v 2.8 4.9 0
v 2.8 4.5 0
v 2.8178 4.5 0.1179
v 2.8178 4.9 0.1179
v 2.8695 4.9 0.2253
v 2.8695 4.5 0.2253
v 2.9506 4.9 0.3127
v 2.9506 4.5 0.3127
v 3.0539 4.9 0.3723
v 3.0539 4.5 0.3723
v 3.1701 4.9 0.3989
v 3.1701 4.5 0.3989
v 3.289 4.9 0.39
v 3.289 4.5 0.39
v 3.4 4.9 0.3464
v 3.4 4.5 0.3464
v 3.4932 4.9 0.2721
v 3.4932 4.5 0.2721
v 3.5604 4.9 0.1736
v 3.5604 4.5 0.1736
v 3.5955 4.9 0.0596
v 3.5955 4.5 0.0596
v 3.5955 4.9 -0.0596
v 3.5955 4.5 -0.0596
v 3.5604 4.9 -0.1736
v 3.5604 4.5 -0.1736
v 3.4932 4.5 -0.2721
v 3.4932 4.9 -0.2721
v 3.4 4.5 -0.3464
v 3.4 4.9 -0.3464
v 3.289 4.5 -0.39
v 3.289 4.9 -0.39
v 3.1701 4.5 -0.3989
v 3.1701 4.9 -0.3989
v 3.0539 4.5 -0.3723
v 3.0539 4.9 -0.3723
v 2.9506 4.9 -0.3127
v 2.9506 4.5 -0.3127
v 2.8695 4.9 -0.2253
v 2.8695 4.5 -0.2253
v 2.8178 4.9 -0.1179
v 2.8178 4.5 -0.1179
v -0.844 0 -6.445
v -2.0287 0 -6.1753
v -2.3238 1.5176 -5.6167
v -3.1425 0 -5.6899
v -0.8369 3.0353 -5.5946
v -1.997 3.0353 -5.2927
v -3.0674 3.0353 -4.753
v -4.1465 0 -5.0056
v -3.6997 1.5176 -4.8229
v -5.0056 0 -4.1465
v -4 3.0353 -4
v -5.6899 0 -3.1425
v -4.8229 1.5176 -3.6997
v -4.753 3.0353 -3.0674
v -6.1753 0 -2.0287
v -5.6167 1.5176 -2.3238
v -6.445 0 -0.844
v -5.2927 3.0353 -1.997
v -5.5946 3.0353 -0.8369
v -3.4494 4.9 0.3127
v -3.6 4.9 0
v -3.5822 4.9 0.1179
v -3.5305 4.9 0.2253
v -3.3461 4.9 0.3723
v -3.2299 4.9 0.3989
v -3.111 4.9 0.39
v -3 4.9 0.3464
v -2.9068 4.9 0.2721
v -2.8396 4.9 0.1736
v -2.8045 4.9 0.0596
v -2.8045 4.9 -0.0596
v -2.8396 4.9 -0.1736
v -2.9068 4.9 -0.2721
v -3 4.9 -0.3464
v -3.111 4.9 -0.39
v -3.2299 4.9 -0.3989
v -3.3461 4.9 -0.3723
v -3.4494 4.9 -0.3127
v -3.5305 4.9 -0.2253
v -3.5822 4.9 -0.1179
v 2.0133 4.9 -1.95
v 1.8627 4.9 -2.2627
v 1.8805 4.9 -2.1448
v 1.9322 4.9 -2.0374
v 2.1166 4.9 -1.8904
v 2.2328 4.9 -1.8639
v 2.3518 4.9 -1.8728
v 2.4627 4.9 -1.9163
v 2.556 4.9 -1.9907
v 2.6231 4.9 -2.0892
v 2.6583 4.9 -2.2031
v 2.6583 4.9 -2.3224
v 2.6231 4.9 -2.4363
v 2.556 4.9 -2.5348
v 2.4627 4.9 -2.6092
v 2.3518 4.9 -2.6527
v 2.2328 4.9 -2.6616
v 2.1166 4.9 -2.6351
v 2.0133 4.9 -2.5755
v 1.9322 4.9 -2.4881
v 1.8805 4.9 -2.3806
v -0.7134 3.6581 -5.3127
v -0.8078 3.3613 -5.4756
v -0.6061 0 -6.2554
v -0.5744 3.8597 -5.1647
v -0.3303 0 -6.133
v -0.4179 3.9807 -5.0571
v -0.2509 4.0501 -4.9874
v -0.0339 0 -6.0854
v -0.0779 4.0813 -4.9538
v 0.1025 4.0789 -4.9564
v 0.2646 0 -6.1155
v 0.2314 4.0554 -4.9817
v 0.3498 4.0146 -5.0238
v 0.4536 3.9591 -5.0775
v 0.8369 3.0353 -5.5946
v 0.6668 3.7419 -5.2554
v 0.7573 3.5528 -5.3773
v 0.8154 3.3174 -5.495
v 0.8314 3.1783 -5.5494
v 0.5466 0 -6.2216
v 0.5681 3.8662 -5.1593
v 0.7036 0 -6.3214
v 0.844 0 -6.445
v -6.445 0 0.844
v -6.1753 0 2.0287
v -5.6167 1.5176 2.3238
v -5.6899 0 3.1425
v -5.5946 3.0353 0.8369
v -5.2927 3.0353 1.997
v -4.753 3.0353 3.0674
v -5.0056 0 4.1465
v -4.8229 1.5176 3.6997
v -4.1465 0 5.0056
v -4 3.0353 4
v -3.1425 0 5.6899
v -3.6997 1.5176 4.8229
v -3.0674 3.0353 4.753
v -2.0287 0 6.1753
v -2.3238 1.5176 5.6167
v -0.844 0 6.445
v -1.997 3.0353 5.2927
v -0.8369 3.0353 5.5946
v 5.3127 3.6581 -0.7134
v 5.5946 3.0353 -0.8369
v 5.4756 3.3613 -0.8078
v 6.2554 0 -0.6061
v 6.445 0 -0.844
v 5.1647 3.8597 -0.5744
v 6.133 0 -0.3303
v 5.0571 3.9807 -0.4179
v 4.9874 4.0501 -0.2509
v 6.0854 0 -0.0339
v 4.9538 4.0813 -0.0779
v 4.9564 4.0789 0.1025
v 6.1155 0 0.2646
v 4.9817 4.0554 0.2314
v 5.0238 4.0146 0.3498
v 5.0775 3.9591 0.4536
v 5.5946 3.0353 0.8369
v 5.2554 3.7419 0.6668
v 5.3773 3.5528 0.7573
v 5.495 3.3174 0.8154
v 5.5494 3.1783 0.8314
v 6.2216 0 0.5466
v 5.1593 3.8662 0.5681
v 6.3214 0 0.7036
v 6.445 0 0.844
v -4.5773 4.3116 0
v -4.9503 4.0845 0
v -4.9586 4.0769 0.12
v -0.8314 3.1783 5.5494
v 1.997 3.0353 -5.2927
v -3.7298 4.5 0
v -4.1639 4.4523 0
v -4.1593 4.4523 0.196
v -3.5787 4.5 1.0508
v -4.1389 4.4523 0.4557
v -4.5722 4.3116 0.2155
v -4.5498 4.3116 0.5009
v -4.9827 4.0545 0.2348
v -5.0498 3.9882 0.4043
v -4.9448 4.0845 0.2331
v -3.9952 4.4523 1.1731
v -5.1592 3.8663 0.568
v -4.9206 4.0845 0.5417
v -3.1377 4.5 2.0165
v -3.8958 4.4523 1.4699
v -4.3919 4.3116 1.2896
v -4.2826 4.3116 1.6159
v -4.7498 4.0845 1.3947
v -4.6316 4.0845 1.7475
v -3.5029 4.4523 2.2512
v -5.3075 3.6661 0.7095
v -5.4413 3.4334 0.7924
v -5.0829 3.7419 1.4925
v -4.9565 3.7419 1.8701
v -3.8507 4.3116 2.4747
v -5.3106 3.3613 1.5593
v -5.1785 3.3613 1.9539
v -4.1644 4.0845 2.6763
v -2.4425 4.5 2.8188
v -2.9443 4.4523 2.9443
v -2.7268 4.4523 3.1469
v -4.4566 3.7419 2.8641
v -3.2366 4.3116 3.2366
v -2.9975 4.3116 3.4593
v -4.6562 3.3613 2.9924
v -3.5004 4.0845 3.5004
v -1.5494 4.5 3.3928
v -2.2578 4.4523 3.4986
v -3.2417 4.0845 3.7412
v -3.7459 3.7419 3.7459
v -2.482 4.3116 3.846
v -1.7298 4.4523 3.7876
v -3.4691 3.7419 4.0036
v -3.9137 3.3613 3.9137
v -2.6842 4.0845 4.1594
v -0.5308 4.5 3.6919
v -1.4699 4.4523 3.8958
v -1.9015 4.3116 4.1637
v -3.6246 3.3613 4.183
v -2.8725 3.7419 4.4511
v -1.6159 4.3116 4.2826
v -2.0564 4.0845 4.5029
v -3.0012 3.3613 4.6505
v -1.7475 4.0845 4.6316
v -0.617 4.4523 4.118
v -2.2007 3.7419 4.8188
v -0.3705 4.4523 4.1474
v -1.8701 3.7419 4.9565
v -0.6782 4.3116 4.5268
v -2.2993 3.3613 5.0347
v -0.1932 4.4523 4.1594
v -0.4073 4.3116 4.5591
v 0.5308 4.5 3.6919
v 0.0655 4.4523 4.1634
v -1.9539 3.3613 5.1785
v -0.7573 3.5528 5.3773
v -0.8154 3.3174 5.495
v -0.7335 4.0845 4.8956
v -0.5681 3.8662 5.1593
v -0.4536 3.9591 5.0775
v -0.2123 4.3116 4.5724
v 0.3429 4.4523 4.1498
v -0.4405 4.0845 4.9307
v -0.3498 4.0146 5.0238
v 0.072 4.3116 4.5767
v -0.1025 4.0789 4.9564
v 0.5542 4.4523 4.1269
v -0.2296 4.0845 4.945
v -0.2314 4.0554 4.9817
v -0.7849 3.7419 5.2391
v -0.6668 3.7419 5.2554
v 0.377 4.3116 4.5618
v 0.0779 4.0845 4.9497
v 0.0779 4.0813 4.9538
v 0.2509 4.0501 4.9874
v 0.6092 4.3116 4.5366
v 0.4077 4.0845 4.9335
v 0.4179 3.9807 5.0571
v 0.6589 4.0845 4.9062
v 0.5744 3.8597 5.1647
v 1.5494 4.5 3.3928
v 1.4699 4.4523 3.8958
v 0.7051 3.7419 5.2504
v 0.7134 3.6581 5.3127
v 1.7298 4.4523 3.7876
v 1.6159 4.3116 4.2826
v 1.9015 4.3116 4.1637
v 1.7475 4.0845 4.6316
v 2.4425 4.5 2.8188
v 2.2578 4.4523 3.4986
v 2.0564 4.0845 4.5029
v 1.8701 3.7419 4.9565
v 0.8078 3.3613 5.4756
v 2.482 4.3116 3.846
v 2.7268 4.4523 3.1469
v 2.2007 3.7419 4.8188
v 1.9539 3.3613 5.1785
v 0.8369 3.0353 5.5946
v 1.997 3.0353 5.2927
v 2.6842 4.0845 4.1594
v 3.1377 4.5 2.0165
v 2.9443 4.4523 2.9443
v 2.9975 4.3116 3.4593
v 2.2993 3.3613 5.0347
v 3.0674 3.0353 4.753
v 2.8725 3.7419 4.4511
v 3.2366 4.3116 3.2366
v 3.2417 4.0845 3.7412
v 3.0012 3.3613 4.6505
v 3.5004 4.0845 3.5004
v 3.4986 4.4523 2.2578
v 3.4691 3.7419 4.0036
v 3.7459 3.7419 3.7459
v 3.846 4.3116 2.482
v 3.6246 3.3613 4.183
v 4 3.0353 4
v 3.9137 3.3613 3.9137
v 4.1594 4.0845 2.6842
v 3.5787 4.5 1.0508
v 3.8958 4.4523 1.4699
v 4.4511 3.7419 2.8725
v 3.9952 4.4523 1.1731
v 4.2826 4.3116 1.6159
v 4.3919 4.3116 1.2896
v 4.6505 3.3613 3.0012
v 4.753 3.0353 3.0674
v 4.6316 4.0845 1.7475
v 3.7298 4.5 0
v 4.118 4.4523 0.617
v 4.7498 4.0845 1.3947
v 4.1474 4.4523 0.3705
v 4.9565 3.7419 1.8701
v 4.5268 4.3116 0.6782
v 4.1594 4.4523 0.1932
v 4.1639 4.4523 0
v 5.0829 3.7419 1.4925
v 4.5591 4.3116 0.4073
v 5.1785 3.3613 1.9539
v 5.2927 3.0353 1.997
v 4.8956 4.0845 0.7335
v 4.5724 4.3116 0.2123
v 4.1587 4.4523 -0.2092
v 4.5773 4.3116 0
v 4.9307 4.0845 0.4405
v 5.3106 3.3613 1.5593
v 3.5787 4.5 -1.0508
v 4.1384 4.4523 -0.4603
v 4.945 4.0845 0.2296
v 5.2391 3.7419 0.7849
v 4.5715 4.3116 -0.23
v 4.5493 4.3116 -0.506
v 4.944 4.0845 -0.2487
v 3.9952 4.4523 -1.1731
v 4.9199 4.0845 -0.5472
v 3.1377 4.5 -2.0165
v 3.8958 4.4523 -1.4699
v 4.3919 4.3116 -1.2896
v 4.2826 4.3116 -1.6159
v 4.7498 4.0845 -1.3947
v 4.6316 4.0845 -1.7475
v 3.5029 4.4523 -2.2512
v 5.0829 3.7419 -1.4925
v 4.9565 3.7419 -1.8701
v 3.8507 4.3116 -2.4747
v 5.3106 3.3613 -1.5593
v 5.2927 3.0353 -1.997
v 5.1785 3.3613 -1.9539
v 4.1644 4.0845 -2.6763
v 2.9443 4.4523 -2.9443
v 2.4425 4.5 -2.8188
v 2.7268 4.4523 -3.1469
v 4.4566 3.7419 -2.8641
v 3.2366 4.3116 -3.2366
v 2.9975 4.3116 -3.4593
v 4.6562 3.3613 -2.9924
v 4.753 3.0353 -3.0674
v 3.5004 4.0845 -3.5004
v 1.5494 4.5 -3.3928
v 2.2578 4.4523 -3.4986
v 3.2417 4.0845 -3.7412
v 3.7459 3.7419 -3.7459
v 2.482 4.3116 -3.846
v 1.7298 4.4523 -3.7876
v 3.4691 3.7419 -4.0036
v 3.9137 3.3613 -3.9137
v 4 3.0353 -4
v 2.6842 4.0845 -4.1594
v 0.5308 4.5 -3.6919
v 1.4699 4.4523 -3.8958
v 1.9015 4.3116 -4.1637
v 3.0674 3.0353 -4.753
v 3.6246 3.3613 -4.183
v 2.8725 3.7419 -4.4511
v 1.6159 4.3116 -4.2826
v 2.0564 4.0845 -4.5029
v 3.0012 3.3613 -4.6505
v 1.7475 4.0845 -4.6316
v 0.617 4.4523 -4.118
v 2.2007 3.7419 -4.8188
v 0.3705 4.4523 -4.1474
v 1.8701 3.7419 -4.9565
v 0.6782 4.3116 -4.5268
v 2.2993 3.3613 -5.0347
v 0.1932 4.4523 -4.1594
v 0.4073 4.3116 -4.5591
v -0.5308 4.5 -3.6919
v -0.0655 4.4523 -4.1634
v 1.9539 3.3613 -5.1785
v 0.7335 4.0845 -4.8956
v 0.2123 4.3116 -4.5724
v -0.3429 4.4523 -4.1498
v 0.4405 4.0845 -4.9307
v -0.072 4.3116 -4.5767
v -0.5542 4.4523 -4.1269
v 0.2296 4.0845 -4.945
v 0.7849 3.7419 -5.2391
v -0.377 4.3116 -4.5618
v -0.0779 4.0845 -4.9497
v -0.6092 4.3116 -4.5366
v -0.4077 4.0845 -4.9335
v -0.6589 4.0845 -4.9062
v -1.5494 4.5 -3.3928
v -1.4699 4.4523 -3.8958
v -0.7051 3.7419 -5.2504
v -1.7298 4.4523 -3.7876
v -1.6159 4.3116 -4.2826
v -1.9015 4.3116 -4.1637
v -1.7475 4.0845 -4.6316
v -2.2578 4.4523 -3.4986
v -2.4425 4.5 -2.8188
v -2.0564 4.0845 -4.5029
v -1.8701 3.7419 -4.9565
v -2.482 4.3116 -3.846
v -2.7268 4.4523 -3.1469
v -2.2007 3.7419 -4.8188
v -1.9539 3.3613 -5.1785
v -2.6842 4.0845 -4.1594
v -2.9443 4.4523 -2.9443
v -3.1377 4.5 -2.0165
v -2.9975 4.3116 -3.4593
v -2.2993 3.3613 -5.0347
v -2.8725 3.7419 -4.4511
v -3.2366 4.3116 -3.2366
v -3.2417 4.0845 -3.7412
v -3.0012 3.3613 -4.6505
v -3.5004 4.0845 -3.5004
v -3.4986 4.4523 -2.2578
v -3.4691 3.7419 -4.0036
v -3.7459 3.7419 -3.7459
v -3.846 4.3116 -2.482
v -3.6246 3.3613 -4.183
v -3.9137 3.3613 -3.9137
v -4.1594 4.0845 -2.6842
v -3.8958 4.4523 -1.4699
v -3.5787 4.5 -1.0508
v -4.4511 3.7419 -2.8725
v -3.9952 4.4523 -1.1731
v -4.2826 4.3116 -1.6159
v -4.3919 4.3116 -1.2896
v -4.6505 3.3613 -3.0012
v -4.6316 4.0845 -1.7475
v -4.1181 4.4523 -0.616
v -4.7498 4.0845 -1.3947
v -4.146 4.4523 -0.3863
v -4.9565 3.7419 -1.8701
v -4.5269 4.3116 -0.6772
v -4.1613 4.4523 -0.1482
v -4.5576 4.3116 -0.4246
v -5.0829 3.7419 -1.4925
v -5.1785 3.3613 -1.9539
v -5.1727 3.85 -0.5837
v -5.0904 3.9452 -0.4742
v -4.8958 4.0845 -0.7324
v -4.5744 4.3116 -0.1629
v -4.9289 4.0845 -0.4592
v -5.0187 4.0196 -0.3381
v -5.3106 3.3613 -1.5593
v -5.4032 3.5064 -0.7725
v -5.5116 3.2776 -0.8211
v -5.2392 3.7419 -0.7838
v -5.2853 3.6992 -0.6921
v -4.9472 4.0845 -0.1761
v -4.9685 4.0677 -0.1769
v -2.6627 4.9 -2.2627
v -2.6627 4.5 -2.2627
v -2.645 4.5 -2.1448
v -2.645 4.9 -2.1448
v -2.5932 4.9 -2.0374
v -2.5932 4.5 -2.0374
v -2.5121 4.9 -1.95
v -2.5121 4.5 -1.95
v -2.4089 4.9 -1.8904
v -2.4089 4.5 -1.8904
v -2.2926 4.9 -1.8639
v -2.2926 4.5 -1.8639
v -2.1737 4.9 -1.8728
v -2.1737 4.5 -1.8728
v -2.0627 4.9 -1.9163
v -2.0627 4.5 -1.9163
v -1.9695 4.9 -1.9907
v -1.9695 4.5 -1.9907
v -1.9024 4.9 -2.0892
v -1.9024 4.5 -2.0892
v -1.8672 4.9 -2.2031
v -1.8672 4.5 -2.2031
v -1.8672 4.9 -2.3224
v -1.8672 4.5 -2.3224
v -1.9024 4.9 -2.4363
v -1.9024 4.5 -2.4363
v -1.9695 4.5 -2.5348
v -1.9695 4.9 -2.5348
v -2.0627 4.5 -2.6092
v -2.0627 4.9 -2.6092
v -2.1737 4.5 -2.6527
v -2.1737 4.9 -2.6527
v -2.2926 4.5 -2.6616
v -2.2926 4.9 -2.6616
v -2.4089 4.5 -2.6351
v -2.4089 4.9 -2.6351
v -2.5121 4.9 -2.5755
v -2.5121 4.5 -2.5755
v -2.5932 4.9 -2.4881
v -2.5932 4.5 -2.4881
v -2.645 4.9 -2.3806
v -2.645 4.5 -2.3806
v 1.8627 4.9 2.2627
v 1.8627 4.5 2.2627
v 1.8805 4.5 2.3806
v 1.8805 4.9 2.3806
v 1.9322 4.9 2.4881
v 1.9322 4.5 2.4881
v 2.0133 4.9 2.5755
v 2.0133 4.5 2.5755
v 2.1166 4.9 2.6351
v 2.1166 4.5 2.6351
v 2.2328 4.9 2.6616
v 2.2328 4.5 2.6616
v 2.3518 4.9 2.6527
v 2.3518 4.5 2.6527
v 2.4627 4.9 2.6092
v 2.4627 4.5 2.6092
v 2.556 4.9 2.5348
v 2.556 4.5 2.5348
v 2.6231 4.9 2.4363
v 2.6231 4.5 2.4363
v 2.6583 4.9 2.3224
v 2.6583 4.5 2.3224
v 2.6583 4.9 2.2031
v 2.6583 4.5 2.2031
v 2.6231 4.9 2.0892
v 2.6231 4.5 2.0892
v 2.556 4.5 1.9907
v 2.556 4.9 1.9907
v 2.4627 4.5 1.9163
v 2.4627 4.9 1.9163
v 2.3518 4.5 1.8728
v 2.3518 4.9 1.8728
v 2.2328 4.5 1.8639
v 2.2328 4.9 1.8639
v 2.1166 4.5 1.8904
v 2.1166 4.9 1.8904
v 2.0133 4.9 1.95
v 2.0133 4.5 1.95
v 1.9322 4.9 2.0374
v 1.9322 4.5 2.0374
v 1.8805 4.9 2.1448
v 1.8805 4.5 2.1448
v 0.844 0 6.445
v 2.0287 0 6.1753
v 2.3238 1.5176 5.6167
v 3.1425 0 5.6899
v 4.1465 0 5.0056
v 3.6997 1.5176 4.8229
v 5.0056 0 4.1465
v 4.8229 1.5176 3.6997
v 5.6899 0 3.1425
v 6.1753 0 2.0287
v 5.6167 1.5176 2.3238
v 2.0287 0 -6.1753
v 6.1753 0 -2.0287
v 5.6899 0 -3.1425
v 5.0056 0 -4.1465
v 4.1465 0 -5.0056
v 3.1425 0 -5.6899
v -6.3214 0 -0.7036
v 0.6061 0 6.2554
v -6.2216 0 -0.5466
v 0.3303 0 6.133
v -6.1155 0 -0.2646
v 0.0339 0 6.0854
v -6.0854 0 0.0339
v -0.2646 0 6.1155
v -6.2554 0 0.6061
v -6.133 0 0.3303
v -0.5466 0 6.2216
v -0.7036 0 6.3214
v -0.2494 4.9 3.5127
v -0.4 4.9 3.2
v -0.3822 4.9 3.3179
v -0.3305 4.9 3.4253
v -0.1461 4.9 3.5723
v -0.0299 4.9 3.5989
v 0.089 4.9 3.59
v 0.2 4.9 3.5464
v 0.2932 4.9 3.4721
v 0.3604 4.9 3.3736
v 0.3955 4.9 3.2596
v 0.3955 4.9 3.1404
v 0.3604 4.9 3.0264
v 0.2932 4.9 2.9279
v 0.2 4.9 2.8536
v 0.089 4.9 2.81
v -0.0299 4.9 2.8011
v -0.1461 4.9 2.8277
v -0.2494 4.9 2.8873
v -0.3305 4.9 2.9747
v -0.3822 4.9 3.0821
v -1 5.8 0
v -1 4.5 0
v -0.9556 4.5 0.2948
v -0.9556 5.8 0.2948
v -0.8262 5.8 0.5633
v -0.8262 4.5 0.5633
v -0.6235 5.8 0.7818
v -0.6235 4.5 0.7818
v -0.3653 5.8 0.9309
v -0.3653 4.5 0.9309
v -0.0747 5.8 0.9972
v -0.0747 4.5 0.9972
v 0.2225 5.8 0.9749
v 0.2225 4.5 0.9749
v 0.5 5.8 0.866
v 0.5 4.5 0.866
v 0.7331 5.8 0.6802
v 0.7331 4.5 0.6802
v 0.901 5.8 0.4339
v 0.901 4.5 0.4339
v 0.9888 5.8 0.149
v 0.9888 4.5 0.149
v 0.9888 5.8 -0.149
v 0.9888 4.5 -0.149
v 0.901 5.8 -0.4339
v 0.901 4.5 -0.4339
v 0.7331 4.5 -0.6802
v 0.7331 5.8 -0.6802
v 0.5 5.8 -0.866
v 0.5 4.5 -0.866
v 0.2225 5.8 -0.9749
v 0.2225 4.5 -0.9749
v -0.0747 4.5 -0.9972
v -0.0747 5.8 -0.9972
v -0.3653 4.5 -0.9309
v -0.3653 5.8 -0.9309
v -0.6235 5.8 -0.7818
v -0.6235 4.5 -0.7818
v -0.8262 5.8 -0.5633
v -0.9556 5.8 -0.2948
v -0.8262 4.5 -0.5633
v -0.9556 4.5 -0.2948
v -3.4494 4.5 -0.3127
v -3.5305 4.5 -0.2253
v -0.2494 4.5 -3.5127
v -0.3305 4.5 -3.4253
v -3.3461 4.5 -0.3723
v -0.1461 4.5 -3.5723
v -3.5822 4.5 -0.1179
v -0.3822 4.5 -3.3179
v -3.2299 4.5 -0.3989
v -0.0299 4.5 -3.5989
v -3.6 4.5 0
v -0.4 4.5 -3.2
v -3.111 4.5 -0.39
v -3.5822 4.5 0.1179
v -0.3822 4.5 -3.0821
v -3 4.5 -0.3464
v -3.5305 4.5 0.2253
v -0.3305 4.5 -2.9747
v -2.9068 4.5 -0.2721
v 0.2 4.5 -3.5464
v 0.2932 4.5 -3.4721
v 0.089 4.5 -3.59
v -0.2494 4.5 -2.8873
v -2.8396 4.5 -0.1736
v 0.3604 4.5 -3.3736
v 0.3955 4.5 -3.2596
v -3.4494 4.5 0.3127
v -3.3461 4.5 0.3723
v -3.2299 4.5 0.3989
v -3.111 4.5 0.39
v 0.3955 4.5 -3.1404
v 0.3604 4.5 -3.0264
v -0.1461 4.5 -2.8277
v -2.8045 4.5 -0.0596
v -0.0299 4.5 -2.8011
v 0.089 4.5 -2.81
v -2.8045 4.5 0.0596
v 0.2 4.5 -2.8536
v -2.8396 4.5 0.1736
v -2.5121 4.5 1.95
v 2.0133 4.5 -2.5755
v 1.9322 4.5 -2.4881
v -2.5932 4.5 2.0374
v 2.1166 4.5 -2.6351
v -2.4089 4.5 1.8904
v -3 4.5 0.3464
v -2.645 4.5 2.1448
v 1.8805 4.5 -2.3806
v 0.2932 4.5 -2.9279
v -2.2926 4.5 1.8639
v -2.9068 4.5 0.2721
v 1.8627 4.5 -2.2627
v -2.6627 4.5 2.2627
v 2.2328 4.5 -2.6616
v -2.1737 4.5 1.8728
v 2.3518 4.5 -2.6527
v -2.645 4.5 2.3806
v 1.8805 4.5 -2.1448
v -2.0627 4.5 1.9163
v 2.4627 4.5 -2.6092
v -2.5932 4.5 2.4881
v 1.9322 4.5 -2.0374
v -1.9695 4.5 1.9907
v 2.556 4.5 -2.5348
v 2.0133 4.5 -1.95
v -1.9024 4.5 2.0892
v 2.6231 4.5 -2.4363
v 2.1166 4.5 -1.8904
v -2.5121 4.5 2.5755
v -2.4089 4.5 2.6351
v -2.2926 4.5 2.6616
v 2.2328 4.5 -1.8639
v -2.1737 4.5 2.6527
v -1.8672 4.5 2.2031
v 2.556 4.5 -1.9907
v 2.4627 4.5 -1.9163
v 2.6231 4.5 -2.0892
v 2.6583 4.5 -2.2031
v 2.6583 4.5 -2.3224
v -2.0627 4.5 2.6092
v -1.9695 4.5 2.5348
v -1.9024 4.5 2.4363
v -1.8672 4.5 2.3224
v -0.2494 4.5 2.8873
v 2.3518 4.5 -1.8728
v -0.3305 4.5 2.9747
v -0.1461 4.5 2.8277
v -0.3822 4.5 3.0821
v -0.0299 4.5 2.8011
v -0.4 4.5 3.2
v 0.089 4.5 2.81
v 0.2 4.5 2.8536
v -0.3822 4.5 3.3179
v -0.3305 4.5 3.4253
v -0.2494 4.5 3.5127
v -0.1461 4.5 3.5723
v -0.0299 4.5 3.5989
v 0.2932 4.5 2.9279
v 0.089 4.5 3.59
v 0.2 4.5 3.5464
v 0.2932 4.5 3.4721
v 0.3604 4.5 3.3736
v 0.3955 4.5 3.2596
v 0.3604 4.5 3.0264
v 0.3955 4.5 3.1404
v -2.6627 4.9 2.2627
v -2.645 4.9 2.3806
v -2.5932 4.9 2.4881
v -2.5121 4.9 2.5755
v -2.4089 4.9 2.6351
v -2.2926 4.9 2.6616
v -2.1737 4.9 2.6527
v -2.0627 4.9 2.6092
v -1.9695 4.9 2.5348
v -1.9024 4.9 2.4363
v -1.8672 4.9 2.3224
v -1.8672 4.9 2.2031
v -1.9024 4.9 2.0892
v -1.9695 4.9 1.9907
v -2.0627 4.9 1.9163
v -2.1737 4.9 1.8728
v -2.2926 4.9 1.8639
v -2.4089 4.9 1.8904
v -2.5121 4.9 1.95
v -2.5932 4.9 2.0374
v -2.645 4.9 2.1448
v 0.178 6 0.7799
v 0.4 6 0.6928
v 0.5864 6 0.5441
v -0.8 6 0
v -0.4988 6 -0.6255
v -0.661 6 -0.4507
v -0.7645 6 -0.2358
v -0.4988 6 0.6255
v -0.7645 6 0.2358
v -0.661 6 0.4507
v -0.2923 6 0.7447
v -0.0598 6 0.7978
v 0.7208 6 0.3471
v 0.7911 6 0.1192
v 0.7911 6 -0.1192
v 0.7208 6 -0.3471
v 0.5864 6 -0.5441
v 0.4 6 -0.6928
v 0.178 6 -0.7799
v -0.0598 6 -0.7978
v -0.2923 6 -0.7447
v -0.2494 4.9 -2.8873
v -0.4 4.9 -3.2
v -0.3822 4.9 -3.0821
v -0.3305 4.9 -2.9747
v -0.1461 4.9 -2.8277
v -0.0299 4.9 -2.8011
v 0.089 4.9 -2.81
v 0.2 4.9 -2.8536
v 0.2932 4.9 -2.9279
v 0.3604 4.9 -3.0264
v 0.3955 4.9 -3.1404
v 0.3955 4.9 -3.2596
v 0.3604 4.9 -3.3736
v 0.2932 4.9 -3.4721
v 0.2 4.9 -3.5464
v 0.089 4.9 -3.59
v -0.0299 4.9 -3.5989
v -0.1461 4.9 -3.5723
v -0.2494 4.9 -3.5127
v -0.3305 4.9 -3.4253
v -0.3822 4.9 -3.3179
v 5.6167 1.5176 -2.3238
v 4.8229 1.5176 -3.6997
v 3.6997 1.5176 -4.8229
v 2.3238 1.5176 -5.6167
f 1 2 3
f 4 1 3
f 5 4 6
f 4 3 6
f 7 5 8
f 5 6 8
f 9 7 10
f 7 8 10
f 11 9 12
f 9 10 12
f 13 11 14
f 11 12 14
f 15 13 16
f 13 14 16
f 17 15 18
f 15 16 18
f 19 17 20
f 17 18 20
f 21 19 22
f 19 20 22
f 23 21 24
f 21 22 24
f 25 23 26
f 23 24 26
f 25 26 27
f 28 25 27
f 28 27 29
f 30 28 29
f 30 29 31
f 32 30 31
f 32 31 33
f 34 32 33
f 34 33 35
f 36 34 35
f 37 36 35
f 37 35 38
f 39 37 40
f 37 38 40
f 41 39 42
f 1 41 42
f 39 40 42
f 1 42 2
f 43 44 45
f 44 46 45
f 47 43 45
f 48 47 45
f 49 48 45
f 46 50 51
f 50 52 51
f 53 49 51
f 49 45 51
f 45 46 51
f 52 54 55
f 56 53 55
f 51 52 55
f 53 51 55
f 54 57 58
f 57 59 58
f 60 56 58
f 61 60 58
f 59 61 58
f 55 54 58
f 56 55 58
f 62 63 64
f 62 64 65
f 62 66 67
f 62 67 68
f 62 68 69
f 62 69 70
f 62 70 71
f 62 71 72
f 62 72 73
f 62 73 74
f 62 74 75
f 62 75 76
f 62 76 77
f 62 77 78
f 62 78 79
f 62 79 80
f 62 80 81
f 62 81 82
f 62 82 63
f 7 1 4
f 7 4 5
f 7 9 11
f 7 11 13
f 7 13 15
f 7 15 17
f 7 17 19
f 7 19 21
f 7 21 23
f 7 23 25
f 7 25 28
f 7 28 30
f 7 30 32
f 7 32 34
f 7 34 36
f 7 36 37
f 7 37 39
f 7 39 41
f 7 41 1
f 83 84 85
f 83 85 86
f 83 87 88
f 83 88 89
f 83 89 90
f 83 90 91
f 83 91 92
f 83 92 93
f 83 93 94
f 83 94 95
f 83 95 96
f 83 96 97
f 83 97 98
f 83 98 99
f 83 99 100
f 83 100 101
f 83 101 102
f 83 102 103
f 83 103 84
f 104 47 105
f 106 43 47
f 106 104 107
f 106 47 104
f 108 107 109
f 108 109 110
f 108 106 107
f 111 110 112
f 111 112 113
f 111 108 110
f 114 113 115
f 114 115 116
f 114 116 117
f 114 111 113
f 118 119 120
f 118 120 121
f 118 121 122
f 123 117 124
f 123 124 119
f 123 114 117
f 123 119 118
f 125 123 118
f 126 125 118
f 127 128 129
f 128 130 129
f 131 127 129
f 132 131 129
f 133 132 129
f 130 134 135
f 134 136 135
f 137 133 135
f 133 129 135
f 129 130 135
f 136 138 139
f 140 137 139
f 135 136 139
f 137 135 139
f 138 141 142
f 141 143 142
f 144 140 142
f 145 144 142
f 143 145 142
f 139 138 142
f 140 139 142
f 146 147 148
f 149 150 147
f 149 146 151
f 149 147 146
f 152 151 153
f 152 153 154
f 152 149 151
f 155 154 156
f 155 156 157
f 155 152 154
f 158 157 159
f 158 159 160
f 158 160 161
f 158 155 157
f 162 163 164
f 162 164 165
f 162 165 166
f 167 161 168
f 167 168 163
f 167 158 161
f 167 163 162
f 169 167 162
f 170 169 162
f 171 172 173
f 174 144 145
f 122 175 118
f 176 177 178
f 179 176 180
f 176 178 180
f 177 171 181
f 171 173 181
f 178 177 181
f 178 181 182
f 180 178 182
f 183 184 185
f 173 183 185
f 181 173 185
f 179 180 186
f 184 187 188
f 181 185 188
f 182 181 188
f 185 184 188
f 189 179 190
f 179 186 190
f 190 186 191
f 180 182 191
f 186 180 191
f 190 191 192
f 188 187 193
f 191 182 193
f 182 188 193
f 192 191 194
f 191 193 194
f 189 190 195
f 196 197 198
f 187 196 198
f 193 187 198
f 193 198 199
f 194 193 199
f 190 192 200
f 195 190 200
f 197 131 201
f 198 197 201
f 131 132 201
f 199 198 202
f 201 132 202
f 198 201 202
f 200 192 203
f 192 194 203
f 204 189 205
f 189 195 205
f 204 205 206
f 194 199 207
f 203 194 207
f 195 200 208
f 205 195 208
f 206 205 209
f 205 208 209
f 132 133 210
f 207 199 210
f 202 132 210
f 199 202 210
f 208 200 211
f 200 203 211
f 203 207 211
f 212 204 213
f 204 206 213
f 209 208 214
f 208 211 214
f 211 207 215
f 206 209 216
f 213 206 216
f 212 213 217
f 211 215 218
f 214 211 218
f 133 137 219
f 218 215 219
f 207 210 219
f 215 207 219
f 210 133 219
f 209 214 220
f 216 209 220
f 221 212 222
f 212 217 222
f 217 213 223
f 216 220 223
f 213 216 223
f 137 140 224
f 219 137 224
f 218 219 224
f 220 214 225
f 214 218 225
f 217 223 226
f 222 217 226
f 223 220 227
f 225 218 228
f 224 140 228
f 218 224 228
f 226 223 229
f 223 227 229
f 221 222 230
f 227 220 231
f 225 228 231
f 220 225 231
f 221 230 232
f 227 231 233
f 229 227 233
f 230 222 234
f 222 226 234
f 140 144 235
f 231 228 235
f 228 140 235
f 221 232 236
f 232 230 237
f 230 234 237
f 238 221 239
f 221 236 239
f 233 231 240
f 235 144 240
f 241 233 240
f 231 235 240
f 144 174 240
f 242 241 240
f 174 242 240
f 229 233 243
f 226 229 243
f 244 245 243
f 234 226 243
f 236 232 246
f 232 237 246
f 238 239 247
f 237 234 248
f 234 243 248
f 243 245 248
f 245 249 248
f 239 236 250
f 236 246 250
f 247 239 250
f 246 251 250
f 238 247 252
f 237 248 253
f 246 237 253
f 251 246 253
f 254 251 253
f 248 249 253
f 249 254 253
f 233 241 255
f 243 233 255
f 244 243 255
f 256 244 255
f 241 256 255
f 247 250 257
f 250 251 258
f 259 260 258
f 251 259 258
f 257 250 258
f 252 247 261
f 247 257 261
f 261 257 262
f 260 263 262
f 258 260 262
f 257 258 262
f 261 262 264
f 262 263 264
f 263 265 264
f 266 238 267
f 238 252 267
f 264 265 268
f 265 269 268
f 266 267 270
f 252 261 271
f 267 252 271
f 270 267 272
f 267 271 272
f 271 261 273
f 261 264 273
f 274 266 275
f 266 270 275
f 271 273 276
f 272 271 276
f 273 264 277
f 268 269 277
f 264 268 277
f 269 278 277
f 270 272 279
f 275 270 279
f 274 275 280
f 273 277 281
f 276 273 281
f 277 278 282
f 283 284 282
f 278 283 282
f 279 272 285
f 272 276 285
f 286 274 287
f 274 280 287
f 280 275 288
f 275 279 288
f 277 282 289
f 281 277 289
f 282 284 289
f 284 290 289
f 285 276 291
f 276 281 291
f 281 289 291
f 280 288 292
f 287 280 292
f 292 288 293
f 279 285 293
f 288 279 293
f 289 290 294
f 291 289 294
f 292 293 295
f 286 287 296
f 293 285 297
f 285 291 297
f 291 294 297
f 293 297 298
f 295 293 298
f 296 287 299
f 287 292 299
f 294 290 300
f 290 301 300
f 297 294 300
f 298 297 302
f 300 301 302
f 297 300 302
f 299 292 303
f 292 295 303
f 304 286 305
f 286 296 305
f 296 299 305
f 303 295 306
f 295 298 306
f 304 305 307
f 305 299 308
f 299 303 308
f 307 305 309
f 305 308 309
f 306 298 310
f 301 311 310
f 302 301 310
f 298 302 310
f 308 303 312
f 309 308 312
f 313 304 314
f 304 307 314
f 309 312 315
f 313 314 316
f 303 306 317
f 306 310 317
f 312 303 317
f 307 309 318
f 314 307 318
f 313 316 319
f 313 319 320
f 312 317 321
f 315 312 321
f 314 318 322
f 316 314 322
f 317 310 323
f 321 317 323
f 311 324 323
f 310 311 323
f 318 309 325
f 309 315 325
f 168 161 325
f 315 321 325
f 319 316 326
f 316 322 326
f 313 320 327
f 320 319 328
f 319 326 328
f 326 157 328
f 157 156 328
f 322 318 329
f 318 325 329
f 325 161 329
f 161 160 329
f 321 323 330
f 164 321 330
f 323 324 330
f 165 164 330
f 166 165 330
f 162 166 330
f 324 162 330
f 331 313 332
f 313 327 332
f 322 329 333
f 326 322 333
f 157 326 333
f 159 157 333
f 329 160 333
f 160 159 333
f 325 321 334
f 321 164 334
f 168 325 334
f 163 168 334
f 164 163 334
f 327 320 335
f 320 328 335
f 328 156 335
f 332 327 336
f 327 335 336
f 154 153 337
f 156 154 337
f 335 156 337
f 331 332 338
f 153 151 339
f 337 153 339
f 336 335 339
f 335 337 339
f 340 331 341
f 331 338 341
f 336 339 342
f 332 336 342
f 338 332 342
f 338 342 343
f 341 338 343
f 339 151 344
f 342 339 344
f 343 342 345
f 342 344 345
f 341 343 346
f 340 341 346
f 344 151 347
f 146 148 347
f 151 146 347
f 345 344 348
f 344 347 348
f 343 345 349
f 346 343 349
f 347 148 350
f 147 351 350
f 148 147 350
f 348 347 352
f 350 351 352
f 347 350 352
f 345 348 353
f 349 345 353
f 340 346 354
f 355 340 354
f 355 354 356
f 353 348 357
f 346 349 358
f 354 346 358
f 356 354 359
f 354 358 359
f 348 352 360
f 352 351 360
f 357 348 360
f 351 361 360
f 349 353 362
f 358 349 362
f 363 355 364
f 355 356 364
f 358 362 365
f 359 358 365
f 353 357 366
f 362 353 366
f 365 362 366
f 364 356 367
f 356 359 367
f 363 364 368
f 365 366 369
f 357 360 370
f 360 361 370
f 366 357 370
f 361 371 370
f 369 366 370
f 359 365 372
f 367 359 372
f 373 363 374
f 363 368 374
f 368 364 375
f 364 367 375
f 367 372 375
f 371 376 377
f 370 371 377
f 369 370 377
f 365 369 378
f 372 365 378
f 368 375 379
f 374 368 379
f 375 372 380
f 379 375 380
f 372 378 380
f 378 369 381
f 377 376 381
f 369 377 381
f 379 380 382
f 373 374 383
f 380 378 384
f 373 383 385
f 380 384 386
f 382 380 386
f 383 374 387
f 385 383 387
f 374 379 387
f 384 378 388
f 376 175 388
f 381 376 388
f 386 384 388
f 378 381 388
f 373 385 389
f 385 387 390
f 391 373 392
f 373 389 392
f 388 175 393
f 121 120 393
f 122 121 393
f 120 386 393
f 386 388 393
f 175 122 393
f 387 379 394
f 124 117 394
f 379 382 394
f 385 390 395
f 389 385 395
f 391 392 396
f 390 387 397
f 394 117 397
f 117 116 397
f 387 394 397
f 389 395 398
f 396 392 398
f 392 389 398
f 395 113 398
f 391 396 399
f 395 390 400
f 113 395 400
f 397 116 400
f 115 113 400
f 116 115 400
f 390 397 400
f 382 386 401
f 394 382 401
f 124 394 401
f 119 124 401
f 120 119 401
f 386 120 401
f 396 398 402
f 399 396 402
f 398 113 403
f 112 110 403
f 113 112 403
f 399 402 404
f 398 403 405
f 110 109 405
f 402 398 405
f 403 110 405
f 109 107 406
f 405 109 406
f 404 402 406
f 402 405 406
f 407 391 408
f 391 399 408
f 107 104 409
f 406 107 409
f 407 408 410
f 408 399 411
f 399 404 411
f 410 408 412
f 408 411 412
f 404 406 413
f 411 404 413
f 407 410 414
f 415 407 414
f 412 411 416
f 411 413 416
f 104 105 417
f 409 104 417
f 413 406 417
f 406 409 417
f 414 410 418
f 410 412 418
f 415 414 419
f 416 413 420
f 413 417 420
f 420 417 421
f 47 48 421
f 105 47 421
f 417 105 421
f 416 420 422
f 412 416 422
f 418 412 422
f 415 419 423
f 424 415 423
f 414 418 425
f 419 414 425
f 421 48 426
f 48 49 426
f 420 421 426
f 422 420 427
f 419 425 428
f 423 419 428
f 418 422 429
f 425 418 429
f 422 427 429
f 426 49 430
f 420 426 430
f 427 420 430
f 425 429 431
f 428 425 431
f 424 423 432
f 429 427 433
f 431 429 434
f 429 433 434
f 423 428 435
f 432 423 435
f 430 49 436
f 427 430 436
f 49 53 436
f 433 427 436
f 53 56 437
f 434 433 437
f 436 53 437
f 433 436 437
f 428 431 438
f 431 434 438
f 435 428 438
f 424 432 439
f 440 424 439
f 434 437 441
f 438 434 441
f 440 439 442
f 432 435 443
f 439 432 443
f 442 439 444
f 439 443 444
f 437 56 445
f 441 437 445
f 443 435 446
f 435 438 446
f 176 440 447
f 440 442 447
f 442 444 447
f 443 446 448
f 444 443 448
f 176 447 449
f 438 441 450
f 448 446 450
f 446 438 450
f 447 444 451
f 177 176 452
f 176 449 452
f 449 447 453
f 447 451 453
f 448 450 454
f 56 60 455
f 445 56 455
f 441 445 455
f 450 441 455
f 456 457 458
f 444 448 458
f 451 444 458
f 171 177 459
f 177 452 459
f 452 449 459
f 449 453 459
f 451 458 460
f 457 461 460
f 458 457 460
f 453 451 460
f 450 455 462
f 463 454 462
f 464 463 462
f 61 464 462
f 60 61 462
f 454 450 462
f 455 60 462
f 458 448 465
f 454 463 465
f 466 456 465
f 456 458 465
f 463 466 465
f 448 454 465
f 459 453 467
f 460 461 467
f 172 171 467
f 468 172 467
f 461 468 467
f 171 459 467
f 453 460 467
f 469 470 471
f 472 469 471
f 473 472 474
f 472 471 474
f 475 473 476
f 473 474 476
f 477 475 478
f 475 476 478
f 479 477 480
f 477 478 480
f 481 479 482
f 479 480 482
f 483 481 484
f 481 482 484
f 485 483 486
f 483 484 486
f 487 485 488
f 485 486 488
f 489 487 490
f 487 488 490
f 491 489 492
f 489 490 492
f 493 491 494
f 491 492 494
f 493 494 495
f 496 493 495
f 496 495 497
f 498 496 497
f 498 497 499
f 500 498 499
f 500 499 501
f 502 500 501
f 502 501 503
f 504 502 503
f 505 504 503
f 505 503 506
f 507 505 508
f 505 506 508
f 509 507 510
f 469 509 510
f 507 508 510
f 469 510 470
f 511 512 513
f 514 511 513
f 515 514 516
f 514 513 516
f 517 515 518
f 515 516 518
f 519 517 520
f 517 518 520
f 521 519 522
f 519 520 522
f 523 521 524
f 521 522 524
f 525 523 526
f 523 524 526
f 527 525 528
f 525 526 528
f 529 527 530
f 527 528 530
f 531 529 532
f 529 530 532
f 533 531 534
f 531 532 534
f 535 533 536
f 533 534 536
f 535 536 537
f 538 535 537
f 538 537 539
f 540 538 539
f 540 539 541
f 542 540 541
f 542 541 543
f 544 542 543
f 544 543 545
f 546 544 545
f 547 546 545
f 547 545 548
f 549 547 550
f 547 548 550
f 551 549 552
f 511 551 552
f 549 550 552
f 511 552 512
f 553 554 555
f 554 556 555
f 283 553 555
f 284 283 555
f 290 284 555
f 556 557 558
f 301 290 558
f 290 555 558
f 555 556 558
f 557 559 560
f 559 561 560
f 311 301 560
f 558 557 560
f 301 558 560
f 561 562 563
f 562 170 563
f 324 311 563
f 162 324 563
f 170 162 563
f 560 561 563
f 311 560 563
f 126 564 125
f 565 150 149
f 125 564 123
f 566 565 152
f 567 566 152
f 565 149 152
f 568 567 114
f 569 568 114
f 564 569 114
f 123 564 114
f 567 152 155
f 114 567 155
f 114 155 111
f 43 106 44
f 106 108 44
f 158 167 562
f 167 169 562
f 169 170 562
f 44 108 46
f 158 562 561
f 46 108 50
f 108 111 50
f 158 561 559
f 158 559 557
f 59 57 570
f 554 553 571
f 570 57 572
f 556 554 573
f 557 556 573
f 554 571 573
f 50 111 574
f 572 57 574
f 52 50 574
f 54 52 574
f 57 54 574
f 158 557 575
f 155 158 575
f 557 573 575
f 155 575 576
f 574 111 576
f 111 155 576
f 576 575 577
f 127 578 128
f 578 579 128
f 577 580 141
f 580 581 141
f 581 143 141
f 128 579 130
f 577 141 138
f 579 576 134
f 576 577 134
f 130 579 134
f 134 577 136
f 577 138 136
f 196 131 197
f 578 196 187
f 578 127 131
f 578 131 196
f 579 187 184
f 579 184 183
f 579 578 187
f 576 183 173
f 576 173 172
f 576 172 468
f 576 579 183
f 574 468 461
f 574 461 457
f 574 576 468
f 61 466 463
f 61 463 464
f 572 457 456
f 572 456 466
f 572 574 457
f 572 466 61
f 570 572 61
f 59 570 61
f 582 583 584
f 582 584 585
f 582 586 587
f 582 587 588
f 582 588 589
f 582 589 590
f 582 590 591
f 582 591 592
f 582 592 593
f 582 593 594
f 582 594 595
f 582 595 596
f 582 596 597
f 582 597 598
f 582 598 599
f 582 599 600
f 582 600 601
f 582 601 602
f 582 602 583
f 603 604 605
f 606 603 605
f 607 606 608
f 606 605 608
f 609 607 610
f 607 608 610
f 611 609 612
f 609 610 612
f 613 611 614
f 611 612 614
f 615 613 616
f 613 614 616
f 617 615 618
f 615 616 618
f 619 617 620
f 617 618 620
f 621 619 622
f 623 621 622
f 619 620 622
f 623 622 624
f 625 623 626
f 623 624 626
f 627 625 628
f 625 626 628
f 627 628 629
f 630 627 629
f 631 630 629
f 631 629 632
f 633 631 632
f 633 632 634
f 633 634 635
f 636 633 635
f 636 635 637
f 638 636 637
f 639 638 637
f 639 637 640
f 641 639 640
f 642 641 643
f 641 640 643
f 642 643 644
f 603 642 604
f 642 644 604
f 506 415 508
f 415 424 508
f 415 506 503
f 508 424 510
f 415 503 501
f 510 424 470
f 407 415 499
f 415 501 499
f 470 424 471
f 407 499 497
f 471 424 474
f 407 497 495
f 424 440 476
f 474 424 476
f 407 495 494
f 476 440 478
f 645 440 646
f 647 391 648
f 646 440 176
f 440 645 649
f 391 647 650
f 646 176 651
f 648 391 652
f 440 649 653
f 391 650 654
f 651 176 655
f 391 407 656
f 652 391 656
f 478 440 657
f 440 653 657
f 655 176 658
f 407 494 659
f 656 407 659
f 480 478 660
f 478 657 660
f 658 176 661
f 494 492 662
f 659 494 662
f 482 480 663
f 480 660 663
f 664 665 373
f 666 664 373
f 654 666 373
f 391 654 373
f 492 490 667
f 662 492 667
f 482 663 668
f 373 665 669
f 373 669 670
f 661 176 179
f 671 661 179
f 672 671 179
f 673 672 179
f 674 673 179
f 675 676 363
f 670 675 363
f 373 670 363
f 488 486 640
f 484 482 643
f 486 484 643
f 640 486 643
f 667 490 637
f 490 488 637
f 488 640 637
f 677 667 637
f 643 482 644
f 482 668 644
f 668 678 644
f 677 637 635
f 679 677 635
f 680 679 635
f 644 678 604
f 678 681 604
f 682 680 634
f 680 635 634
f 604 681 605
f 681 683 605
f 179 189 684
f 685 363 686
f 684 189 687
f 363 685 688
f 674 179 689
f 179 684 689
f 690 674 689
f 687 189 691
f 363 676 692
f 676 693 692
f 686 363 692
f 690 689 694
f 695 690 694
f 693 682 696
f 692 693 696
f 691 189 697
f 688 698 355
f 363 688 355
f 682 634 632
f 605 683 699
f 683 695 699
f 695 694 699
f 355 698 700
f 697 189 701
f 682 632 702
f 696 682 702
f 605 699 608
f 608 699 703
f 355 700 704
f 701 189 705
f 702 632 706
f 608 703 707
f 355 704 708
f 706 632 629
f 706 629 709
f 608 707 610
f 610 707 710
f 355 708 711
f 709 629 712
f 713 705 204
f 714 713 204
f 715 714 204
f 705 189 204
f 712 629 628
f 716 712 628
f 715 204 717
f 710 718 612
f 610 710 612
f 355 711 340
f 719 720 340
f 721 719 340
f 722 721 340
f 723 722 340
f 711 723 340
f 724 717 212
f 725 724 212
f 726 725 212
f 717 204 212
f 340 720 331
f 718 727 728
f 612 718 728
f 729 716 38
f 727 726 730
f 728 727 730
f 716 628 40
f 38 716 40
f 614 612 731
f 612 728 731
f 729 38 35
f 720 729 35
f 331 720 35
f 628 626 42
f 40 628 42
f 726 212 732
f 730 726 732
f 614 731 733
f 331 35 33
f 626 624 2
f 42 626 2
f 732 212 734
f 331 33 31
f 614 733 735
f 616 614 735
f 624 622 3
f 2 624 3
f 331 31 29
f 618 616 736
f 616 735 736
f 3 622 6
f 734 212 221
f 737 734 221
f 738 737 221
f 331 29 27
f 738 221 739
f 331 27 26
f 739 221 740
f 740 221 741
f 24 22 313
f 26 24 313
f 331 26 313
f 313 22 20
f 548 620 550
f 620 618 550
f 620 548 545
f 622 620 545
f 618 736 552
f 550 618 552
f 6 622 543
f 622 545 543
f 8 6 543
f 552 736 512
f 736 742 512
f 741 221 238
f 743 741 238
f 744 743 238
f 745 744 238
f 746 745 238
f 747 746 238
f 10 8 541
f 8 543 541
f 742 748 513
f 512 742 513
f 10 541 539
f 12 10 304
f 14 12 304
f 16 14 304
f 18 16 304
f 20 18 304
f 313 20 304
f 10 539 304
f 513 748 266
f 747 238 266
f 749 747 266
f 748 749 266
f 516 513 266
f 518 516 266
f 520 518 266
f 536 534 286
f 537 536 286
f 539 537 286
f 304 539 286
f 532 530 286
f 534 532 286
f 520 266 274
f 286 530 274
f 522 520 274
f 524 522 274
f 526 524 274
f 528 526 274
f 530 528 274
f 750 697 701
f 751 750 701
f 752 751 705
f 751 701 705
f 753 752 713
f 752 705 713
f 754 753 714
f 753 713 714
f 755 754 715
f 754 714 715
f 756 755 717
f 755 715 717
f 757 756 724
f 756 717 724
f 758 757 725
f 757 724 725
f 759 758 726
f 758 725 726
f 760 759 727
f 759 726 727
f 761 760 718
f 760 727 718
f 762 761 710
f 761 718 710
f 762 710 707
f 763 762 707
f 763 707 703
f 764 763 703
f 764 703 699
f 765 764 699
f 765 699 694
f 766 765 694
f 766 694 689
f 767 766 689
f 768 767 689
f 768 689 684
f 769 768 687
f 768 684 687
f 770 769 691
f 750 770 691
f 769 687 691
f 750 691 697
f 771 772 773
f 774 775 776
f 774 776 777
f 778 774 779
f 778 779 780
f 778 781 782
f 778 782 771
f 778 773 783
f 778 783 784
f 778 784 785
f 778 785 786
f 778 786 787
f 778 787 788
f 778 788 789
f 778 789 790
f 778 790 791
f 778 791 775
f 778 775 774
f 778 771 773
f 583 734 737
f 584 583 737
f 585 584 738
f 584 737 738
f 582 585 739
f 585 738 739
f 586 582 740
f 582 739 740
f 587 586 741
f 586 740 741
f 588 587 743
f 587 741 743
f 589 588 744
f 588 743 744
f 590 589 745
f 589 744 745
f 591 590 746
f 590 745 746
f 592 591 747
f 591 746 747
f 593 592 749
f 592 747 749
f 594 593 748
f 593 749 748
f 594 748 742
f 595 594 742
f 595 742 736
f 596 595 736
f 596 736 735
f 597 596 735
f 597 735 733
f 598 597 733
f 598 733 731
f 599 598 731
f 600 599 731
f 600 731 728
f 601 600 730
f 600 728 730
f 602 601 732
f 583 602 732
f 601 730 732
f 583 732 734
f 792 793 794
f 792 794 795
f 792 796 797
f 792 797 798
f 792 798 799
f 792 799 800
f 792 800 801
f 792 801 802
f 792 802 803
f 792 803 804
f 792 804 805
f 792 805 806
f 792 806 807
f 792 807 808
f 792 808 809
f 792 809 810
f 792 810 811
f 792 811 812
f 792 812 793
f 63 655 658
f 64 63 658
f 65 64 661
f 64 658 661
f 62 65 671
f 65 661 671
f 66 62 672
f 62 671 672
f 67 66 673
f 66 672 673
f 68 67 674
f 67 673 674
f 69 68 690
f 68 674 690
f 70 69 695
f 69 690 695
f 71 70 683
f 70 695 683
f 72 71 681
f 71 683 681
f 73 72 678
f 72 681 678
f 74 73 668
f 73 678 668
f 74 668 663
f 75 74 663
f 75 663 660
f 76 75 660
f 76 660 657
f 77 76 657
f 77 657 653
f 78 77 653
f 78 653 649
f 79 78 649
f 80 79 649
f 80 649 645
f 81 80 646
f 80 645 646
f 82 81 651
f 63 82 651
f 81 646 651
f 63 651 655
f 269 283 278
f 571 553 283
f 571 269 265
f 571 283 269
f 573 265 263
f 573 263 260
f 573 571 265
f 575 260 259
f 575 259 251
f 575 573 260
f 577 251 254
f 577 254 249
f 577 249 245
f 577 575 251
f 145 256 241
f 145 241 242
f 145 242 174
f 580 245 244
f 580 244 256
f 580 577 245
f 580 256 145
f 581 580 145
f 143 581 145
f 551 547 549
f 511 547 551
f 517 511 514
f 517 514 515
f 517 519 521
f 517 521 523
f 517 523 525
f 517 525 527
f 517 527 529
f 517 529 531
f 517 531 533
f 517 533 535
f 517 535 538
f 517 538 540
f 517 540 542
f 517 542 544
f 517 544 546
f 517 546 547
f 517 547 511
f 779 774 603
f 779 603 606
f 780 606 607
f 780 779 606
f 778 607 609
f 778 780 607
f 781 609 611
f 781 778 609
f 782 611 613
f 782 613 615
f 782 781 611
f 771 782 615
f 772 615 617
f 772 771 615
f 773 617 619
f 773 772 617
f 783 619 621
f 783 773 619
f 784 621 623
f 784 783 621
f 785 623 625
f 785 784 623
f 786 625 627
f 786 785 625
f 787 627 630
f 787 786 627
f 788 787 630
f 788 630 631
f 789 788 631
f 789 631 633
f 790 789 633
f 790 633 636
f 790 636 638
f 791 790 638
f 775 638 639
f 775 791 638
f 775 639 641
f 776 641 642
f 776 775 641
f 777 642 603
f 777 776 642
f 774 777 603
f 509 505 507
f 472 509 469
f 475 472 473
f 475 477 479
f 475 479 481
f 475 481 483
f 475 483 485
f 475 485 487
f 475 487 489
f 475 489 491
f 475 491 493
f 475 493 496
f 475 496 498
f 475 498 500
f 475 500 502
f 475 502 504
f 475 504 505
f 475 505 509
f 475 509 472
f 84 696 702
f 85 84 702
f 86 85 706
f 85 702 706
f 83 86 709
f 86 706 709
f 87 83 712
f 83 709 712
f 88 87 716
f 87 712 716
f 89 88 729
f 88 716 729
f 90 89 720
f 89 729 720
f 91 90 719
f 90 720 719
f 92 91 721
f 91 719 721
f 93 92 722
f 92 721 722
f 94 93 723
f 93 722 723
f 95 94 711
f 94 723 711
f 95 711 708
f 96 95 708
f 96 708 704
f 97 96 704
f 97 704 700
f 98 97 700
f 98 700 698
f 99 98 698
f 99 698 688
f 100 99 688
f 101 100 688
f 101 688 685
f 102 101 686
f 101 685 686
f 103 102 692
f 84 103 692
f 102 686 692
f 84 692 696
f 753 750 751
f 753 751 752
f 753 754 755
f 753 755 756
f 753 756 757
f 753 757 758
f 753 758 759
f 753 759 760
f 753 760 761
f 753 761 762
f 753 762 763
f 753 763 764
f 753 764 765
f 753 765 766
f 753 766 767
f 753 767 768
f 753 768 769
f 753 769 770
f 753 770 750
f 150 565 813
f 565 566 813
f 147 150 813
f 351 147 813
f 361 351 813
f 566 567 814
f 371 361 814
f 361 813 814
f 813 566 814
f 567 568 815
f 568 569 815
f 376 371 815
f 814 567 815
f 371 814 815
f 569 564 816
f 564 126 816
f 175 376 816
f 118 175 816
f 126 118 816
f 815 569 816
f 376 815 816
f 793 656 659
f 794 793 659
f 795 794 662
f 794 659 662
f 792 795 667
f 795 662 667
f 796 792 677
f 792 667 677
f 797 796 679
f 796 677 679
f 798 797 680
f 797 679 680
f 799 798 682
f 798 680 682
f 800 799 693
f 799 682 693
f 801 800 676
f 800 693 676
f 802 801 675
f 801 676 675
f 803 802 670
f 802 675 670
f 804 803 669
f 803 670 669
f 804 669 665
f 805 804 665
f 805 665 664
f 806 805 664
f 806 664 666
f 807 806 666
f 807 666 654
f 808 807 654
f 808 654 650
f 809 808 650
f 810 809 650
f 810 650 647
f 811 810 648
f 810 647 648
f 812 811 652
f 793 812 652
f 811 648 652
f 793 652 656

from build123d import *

# Parameters (mm, degrees)
F2_R     = 1
F3_DEPTH = 1.5
F4_SIZE  = 0.2
F5_R     = 0.4
F6_DEPTH = 0.4
F9_COUNT = 4


with BuildPart() as f1:
    # F0 (on Top) → F1 (revolve)
    with BuildSketch(Plane.XY):
        with BuildLine():
            Line((-6.5, 0), (0, 0))
            Line((0, 0), (0, 4.5))
            Line((0, 4.5), (-3.7298287009, 4.5))
            ThreePointArc((-3.7298287009, 4.5), (-4.9400816795, 4.0922586874), (-5.6568645201, 3.0352877276))
            Line((-5.6568645201, 3.0352877276), (-6.5, 0))
        make_face()
    revolve(axis=Axis((0, 13.4025972581, 0), (0, 1, 0)))

    # F2 (on face) → F3 (join)
    with BuildSketch(Plane(origin=(0, 4.5, 0), x_dir=(-1, 0, 0), z_dir=(0, 1, 0))):
        Circle(F2_R)
    extrude(amount=F3_DEPTH)

    # F4
    f4_edges = [f1.edges().sort_by_distance(p)[0] for p in [
        (1, 6, 0),
    ]]
    chamfer(f4_edges, length=F4_SIZE)

    # F5 (on face) → F6 (join)
    with BuildSketch(Plane(origin=(0, 4.5, 0), x_dir=(-1, 0, 0), z_dir=(0, 1, 0))):
        with Locations((0, 3.2)):
            Circle(F5_R)
        with Locations((3.2, 0)):
            Circle(F5_R)
        with Locations((0, -3.2)):
            Circle(F5_R)
        with Locations((-3.2, 0)):
            Circle(F5_R)
        with Locations((-2.2627416998, 2.2627416998)):
            Circle(F5_R)
        with Locations((2.2627416998, 2.2627416998)):
            Circle(F5_R)
        with Locations((2.2627416998, -2.2627416998)):
            Circle(F5_R)
        with Locations((-2.2627416998, -2.2627416998)):
            Circle(F5_R)
    extrude(amount=F6_DEPTH)


with BuildPart() as f8:
    # F7 (on Right) → F8 (revolve)
    with BuildSketch(Plane.YZ):
        Polygon((-0.7489218035, 8.783760689), (-1.07009444, 7.6275391974), (6.0141044293, 5.6597061782), (6.3352770658, 6.8159276697), align=None)
    revolve(axis=Axis((0, 4.9801668253, 5.9469110682), (0, 0.9635179096, -0.2676438638)))


with BuildPart() as f9_1:
    # F9: instance of F8
    add(f8.part.rotate(Axis((0, 5.8, 0), (0, 1, 0)), 1 * 360 / F9_COUNT))


with BuildPart() as f9_2:
    # F9: instance of F8
    add(f8.part.rotate(Axis((0, 5.8, 0), (0, 1, 0)), 2 * 360 / F9_COUNT))


with BuildPart() as f9_3:
    # F9: instance of F8
    add(f8.part.rotate(Axis((0, 5.8, 0), (0, 1, 0)), 3 * 360 / F9_COUNT))


with BuildPart() as f1_1:
    add(f1.part)

    # F10: cut F8, F9_1, F9_2, F9_3
    add(f8.part, mode=Mode.SUBTRACT)
    add(f9_1.part, mode=Mode.SUBTRACT)
    add(f9_2.part, mode=Mode.SUBTRACT)
    add(f9_3.part, mode=Mode.SUBTRACT)


solid = f1_1.part
